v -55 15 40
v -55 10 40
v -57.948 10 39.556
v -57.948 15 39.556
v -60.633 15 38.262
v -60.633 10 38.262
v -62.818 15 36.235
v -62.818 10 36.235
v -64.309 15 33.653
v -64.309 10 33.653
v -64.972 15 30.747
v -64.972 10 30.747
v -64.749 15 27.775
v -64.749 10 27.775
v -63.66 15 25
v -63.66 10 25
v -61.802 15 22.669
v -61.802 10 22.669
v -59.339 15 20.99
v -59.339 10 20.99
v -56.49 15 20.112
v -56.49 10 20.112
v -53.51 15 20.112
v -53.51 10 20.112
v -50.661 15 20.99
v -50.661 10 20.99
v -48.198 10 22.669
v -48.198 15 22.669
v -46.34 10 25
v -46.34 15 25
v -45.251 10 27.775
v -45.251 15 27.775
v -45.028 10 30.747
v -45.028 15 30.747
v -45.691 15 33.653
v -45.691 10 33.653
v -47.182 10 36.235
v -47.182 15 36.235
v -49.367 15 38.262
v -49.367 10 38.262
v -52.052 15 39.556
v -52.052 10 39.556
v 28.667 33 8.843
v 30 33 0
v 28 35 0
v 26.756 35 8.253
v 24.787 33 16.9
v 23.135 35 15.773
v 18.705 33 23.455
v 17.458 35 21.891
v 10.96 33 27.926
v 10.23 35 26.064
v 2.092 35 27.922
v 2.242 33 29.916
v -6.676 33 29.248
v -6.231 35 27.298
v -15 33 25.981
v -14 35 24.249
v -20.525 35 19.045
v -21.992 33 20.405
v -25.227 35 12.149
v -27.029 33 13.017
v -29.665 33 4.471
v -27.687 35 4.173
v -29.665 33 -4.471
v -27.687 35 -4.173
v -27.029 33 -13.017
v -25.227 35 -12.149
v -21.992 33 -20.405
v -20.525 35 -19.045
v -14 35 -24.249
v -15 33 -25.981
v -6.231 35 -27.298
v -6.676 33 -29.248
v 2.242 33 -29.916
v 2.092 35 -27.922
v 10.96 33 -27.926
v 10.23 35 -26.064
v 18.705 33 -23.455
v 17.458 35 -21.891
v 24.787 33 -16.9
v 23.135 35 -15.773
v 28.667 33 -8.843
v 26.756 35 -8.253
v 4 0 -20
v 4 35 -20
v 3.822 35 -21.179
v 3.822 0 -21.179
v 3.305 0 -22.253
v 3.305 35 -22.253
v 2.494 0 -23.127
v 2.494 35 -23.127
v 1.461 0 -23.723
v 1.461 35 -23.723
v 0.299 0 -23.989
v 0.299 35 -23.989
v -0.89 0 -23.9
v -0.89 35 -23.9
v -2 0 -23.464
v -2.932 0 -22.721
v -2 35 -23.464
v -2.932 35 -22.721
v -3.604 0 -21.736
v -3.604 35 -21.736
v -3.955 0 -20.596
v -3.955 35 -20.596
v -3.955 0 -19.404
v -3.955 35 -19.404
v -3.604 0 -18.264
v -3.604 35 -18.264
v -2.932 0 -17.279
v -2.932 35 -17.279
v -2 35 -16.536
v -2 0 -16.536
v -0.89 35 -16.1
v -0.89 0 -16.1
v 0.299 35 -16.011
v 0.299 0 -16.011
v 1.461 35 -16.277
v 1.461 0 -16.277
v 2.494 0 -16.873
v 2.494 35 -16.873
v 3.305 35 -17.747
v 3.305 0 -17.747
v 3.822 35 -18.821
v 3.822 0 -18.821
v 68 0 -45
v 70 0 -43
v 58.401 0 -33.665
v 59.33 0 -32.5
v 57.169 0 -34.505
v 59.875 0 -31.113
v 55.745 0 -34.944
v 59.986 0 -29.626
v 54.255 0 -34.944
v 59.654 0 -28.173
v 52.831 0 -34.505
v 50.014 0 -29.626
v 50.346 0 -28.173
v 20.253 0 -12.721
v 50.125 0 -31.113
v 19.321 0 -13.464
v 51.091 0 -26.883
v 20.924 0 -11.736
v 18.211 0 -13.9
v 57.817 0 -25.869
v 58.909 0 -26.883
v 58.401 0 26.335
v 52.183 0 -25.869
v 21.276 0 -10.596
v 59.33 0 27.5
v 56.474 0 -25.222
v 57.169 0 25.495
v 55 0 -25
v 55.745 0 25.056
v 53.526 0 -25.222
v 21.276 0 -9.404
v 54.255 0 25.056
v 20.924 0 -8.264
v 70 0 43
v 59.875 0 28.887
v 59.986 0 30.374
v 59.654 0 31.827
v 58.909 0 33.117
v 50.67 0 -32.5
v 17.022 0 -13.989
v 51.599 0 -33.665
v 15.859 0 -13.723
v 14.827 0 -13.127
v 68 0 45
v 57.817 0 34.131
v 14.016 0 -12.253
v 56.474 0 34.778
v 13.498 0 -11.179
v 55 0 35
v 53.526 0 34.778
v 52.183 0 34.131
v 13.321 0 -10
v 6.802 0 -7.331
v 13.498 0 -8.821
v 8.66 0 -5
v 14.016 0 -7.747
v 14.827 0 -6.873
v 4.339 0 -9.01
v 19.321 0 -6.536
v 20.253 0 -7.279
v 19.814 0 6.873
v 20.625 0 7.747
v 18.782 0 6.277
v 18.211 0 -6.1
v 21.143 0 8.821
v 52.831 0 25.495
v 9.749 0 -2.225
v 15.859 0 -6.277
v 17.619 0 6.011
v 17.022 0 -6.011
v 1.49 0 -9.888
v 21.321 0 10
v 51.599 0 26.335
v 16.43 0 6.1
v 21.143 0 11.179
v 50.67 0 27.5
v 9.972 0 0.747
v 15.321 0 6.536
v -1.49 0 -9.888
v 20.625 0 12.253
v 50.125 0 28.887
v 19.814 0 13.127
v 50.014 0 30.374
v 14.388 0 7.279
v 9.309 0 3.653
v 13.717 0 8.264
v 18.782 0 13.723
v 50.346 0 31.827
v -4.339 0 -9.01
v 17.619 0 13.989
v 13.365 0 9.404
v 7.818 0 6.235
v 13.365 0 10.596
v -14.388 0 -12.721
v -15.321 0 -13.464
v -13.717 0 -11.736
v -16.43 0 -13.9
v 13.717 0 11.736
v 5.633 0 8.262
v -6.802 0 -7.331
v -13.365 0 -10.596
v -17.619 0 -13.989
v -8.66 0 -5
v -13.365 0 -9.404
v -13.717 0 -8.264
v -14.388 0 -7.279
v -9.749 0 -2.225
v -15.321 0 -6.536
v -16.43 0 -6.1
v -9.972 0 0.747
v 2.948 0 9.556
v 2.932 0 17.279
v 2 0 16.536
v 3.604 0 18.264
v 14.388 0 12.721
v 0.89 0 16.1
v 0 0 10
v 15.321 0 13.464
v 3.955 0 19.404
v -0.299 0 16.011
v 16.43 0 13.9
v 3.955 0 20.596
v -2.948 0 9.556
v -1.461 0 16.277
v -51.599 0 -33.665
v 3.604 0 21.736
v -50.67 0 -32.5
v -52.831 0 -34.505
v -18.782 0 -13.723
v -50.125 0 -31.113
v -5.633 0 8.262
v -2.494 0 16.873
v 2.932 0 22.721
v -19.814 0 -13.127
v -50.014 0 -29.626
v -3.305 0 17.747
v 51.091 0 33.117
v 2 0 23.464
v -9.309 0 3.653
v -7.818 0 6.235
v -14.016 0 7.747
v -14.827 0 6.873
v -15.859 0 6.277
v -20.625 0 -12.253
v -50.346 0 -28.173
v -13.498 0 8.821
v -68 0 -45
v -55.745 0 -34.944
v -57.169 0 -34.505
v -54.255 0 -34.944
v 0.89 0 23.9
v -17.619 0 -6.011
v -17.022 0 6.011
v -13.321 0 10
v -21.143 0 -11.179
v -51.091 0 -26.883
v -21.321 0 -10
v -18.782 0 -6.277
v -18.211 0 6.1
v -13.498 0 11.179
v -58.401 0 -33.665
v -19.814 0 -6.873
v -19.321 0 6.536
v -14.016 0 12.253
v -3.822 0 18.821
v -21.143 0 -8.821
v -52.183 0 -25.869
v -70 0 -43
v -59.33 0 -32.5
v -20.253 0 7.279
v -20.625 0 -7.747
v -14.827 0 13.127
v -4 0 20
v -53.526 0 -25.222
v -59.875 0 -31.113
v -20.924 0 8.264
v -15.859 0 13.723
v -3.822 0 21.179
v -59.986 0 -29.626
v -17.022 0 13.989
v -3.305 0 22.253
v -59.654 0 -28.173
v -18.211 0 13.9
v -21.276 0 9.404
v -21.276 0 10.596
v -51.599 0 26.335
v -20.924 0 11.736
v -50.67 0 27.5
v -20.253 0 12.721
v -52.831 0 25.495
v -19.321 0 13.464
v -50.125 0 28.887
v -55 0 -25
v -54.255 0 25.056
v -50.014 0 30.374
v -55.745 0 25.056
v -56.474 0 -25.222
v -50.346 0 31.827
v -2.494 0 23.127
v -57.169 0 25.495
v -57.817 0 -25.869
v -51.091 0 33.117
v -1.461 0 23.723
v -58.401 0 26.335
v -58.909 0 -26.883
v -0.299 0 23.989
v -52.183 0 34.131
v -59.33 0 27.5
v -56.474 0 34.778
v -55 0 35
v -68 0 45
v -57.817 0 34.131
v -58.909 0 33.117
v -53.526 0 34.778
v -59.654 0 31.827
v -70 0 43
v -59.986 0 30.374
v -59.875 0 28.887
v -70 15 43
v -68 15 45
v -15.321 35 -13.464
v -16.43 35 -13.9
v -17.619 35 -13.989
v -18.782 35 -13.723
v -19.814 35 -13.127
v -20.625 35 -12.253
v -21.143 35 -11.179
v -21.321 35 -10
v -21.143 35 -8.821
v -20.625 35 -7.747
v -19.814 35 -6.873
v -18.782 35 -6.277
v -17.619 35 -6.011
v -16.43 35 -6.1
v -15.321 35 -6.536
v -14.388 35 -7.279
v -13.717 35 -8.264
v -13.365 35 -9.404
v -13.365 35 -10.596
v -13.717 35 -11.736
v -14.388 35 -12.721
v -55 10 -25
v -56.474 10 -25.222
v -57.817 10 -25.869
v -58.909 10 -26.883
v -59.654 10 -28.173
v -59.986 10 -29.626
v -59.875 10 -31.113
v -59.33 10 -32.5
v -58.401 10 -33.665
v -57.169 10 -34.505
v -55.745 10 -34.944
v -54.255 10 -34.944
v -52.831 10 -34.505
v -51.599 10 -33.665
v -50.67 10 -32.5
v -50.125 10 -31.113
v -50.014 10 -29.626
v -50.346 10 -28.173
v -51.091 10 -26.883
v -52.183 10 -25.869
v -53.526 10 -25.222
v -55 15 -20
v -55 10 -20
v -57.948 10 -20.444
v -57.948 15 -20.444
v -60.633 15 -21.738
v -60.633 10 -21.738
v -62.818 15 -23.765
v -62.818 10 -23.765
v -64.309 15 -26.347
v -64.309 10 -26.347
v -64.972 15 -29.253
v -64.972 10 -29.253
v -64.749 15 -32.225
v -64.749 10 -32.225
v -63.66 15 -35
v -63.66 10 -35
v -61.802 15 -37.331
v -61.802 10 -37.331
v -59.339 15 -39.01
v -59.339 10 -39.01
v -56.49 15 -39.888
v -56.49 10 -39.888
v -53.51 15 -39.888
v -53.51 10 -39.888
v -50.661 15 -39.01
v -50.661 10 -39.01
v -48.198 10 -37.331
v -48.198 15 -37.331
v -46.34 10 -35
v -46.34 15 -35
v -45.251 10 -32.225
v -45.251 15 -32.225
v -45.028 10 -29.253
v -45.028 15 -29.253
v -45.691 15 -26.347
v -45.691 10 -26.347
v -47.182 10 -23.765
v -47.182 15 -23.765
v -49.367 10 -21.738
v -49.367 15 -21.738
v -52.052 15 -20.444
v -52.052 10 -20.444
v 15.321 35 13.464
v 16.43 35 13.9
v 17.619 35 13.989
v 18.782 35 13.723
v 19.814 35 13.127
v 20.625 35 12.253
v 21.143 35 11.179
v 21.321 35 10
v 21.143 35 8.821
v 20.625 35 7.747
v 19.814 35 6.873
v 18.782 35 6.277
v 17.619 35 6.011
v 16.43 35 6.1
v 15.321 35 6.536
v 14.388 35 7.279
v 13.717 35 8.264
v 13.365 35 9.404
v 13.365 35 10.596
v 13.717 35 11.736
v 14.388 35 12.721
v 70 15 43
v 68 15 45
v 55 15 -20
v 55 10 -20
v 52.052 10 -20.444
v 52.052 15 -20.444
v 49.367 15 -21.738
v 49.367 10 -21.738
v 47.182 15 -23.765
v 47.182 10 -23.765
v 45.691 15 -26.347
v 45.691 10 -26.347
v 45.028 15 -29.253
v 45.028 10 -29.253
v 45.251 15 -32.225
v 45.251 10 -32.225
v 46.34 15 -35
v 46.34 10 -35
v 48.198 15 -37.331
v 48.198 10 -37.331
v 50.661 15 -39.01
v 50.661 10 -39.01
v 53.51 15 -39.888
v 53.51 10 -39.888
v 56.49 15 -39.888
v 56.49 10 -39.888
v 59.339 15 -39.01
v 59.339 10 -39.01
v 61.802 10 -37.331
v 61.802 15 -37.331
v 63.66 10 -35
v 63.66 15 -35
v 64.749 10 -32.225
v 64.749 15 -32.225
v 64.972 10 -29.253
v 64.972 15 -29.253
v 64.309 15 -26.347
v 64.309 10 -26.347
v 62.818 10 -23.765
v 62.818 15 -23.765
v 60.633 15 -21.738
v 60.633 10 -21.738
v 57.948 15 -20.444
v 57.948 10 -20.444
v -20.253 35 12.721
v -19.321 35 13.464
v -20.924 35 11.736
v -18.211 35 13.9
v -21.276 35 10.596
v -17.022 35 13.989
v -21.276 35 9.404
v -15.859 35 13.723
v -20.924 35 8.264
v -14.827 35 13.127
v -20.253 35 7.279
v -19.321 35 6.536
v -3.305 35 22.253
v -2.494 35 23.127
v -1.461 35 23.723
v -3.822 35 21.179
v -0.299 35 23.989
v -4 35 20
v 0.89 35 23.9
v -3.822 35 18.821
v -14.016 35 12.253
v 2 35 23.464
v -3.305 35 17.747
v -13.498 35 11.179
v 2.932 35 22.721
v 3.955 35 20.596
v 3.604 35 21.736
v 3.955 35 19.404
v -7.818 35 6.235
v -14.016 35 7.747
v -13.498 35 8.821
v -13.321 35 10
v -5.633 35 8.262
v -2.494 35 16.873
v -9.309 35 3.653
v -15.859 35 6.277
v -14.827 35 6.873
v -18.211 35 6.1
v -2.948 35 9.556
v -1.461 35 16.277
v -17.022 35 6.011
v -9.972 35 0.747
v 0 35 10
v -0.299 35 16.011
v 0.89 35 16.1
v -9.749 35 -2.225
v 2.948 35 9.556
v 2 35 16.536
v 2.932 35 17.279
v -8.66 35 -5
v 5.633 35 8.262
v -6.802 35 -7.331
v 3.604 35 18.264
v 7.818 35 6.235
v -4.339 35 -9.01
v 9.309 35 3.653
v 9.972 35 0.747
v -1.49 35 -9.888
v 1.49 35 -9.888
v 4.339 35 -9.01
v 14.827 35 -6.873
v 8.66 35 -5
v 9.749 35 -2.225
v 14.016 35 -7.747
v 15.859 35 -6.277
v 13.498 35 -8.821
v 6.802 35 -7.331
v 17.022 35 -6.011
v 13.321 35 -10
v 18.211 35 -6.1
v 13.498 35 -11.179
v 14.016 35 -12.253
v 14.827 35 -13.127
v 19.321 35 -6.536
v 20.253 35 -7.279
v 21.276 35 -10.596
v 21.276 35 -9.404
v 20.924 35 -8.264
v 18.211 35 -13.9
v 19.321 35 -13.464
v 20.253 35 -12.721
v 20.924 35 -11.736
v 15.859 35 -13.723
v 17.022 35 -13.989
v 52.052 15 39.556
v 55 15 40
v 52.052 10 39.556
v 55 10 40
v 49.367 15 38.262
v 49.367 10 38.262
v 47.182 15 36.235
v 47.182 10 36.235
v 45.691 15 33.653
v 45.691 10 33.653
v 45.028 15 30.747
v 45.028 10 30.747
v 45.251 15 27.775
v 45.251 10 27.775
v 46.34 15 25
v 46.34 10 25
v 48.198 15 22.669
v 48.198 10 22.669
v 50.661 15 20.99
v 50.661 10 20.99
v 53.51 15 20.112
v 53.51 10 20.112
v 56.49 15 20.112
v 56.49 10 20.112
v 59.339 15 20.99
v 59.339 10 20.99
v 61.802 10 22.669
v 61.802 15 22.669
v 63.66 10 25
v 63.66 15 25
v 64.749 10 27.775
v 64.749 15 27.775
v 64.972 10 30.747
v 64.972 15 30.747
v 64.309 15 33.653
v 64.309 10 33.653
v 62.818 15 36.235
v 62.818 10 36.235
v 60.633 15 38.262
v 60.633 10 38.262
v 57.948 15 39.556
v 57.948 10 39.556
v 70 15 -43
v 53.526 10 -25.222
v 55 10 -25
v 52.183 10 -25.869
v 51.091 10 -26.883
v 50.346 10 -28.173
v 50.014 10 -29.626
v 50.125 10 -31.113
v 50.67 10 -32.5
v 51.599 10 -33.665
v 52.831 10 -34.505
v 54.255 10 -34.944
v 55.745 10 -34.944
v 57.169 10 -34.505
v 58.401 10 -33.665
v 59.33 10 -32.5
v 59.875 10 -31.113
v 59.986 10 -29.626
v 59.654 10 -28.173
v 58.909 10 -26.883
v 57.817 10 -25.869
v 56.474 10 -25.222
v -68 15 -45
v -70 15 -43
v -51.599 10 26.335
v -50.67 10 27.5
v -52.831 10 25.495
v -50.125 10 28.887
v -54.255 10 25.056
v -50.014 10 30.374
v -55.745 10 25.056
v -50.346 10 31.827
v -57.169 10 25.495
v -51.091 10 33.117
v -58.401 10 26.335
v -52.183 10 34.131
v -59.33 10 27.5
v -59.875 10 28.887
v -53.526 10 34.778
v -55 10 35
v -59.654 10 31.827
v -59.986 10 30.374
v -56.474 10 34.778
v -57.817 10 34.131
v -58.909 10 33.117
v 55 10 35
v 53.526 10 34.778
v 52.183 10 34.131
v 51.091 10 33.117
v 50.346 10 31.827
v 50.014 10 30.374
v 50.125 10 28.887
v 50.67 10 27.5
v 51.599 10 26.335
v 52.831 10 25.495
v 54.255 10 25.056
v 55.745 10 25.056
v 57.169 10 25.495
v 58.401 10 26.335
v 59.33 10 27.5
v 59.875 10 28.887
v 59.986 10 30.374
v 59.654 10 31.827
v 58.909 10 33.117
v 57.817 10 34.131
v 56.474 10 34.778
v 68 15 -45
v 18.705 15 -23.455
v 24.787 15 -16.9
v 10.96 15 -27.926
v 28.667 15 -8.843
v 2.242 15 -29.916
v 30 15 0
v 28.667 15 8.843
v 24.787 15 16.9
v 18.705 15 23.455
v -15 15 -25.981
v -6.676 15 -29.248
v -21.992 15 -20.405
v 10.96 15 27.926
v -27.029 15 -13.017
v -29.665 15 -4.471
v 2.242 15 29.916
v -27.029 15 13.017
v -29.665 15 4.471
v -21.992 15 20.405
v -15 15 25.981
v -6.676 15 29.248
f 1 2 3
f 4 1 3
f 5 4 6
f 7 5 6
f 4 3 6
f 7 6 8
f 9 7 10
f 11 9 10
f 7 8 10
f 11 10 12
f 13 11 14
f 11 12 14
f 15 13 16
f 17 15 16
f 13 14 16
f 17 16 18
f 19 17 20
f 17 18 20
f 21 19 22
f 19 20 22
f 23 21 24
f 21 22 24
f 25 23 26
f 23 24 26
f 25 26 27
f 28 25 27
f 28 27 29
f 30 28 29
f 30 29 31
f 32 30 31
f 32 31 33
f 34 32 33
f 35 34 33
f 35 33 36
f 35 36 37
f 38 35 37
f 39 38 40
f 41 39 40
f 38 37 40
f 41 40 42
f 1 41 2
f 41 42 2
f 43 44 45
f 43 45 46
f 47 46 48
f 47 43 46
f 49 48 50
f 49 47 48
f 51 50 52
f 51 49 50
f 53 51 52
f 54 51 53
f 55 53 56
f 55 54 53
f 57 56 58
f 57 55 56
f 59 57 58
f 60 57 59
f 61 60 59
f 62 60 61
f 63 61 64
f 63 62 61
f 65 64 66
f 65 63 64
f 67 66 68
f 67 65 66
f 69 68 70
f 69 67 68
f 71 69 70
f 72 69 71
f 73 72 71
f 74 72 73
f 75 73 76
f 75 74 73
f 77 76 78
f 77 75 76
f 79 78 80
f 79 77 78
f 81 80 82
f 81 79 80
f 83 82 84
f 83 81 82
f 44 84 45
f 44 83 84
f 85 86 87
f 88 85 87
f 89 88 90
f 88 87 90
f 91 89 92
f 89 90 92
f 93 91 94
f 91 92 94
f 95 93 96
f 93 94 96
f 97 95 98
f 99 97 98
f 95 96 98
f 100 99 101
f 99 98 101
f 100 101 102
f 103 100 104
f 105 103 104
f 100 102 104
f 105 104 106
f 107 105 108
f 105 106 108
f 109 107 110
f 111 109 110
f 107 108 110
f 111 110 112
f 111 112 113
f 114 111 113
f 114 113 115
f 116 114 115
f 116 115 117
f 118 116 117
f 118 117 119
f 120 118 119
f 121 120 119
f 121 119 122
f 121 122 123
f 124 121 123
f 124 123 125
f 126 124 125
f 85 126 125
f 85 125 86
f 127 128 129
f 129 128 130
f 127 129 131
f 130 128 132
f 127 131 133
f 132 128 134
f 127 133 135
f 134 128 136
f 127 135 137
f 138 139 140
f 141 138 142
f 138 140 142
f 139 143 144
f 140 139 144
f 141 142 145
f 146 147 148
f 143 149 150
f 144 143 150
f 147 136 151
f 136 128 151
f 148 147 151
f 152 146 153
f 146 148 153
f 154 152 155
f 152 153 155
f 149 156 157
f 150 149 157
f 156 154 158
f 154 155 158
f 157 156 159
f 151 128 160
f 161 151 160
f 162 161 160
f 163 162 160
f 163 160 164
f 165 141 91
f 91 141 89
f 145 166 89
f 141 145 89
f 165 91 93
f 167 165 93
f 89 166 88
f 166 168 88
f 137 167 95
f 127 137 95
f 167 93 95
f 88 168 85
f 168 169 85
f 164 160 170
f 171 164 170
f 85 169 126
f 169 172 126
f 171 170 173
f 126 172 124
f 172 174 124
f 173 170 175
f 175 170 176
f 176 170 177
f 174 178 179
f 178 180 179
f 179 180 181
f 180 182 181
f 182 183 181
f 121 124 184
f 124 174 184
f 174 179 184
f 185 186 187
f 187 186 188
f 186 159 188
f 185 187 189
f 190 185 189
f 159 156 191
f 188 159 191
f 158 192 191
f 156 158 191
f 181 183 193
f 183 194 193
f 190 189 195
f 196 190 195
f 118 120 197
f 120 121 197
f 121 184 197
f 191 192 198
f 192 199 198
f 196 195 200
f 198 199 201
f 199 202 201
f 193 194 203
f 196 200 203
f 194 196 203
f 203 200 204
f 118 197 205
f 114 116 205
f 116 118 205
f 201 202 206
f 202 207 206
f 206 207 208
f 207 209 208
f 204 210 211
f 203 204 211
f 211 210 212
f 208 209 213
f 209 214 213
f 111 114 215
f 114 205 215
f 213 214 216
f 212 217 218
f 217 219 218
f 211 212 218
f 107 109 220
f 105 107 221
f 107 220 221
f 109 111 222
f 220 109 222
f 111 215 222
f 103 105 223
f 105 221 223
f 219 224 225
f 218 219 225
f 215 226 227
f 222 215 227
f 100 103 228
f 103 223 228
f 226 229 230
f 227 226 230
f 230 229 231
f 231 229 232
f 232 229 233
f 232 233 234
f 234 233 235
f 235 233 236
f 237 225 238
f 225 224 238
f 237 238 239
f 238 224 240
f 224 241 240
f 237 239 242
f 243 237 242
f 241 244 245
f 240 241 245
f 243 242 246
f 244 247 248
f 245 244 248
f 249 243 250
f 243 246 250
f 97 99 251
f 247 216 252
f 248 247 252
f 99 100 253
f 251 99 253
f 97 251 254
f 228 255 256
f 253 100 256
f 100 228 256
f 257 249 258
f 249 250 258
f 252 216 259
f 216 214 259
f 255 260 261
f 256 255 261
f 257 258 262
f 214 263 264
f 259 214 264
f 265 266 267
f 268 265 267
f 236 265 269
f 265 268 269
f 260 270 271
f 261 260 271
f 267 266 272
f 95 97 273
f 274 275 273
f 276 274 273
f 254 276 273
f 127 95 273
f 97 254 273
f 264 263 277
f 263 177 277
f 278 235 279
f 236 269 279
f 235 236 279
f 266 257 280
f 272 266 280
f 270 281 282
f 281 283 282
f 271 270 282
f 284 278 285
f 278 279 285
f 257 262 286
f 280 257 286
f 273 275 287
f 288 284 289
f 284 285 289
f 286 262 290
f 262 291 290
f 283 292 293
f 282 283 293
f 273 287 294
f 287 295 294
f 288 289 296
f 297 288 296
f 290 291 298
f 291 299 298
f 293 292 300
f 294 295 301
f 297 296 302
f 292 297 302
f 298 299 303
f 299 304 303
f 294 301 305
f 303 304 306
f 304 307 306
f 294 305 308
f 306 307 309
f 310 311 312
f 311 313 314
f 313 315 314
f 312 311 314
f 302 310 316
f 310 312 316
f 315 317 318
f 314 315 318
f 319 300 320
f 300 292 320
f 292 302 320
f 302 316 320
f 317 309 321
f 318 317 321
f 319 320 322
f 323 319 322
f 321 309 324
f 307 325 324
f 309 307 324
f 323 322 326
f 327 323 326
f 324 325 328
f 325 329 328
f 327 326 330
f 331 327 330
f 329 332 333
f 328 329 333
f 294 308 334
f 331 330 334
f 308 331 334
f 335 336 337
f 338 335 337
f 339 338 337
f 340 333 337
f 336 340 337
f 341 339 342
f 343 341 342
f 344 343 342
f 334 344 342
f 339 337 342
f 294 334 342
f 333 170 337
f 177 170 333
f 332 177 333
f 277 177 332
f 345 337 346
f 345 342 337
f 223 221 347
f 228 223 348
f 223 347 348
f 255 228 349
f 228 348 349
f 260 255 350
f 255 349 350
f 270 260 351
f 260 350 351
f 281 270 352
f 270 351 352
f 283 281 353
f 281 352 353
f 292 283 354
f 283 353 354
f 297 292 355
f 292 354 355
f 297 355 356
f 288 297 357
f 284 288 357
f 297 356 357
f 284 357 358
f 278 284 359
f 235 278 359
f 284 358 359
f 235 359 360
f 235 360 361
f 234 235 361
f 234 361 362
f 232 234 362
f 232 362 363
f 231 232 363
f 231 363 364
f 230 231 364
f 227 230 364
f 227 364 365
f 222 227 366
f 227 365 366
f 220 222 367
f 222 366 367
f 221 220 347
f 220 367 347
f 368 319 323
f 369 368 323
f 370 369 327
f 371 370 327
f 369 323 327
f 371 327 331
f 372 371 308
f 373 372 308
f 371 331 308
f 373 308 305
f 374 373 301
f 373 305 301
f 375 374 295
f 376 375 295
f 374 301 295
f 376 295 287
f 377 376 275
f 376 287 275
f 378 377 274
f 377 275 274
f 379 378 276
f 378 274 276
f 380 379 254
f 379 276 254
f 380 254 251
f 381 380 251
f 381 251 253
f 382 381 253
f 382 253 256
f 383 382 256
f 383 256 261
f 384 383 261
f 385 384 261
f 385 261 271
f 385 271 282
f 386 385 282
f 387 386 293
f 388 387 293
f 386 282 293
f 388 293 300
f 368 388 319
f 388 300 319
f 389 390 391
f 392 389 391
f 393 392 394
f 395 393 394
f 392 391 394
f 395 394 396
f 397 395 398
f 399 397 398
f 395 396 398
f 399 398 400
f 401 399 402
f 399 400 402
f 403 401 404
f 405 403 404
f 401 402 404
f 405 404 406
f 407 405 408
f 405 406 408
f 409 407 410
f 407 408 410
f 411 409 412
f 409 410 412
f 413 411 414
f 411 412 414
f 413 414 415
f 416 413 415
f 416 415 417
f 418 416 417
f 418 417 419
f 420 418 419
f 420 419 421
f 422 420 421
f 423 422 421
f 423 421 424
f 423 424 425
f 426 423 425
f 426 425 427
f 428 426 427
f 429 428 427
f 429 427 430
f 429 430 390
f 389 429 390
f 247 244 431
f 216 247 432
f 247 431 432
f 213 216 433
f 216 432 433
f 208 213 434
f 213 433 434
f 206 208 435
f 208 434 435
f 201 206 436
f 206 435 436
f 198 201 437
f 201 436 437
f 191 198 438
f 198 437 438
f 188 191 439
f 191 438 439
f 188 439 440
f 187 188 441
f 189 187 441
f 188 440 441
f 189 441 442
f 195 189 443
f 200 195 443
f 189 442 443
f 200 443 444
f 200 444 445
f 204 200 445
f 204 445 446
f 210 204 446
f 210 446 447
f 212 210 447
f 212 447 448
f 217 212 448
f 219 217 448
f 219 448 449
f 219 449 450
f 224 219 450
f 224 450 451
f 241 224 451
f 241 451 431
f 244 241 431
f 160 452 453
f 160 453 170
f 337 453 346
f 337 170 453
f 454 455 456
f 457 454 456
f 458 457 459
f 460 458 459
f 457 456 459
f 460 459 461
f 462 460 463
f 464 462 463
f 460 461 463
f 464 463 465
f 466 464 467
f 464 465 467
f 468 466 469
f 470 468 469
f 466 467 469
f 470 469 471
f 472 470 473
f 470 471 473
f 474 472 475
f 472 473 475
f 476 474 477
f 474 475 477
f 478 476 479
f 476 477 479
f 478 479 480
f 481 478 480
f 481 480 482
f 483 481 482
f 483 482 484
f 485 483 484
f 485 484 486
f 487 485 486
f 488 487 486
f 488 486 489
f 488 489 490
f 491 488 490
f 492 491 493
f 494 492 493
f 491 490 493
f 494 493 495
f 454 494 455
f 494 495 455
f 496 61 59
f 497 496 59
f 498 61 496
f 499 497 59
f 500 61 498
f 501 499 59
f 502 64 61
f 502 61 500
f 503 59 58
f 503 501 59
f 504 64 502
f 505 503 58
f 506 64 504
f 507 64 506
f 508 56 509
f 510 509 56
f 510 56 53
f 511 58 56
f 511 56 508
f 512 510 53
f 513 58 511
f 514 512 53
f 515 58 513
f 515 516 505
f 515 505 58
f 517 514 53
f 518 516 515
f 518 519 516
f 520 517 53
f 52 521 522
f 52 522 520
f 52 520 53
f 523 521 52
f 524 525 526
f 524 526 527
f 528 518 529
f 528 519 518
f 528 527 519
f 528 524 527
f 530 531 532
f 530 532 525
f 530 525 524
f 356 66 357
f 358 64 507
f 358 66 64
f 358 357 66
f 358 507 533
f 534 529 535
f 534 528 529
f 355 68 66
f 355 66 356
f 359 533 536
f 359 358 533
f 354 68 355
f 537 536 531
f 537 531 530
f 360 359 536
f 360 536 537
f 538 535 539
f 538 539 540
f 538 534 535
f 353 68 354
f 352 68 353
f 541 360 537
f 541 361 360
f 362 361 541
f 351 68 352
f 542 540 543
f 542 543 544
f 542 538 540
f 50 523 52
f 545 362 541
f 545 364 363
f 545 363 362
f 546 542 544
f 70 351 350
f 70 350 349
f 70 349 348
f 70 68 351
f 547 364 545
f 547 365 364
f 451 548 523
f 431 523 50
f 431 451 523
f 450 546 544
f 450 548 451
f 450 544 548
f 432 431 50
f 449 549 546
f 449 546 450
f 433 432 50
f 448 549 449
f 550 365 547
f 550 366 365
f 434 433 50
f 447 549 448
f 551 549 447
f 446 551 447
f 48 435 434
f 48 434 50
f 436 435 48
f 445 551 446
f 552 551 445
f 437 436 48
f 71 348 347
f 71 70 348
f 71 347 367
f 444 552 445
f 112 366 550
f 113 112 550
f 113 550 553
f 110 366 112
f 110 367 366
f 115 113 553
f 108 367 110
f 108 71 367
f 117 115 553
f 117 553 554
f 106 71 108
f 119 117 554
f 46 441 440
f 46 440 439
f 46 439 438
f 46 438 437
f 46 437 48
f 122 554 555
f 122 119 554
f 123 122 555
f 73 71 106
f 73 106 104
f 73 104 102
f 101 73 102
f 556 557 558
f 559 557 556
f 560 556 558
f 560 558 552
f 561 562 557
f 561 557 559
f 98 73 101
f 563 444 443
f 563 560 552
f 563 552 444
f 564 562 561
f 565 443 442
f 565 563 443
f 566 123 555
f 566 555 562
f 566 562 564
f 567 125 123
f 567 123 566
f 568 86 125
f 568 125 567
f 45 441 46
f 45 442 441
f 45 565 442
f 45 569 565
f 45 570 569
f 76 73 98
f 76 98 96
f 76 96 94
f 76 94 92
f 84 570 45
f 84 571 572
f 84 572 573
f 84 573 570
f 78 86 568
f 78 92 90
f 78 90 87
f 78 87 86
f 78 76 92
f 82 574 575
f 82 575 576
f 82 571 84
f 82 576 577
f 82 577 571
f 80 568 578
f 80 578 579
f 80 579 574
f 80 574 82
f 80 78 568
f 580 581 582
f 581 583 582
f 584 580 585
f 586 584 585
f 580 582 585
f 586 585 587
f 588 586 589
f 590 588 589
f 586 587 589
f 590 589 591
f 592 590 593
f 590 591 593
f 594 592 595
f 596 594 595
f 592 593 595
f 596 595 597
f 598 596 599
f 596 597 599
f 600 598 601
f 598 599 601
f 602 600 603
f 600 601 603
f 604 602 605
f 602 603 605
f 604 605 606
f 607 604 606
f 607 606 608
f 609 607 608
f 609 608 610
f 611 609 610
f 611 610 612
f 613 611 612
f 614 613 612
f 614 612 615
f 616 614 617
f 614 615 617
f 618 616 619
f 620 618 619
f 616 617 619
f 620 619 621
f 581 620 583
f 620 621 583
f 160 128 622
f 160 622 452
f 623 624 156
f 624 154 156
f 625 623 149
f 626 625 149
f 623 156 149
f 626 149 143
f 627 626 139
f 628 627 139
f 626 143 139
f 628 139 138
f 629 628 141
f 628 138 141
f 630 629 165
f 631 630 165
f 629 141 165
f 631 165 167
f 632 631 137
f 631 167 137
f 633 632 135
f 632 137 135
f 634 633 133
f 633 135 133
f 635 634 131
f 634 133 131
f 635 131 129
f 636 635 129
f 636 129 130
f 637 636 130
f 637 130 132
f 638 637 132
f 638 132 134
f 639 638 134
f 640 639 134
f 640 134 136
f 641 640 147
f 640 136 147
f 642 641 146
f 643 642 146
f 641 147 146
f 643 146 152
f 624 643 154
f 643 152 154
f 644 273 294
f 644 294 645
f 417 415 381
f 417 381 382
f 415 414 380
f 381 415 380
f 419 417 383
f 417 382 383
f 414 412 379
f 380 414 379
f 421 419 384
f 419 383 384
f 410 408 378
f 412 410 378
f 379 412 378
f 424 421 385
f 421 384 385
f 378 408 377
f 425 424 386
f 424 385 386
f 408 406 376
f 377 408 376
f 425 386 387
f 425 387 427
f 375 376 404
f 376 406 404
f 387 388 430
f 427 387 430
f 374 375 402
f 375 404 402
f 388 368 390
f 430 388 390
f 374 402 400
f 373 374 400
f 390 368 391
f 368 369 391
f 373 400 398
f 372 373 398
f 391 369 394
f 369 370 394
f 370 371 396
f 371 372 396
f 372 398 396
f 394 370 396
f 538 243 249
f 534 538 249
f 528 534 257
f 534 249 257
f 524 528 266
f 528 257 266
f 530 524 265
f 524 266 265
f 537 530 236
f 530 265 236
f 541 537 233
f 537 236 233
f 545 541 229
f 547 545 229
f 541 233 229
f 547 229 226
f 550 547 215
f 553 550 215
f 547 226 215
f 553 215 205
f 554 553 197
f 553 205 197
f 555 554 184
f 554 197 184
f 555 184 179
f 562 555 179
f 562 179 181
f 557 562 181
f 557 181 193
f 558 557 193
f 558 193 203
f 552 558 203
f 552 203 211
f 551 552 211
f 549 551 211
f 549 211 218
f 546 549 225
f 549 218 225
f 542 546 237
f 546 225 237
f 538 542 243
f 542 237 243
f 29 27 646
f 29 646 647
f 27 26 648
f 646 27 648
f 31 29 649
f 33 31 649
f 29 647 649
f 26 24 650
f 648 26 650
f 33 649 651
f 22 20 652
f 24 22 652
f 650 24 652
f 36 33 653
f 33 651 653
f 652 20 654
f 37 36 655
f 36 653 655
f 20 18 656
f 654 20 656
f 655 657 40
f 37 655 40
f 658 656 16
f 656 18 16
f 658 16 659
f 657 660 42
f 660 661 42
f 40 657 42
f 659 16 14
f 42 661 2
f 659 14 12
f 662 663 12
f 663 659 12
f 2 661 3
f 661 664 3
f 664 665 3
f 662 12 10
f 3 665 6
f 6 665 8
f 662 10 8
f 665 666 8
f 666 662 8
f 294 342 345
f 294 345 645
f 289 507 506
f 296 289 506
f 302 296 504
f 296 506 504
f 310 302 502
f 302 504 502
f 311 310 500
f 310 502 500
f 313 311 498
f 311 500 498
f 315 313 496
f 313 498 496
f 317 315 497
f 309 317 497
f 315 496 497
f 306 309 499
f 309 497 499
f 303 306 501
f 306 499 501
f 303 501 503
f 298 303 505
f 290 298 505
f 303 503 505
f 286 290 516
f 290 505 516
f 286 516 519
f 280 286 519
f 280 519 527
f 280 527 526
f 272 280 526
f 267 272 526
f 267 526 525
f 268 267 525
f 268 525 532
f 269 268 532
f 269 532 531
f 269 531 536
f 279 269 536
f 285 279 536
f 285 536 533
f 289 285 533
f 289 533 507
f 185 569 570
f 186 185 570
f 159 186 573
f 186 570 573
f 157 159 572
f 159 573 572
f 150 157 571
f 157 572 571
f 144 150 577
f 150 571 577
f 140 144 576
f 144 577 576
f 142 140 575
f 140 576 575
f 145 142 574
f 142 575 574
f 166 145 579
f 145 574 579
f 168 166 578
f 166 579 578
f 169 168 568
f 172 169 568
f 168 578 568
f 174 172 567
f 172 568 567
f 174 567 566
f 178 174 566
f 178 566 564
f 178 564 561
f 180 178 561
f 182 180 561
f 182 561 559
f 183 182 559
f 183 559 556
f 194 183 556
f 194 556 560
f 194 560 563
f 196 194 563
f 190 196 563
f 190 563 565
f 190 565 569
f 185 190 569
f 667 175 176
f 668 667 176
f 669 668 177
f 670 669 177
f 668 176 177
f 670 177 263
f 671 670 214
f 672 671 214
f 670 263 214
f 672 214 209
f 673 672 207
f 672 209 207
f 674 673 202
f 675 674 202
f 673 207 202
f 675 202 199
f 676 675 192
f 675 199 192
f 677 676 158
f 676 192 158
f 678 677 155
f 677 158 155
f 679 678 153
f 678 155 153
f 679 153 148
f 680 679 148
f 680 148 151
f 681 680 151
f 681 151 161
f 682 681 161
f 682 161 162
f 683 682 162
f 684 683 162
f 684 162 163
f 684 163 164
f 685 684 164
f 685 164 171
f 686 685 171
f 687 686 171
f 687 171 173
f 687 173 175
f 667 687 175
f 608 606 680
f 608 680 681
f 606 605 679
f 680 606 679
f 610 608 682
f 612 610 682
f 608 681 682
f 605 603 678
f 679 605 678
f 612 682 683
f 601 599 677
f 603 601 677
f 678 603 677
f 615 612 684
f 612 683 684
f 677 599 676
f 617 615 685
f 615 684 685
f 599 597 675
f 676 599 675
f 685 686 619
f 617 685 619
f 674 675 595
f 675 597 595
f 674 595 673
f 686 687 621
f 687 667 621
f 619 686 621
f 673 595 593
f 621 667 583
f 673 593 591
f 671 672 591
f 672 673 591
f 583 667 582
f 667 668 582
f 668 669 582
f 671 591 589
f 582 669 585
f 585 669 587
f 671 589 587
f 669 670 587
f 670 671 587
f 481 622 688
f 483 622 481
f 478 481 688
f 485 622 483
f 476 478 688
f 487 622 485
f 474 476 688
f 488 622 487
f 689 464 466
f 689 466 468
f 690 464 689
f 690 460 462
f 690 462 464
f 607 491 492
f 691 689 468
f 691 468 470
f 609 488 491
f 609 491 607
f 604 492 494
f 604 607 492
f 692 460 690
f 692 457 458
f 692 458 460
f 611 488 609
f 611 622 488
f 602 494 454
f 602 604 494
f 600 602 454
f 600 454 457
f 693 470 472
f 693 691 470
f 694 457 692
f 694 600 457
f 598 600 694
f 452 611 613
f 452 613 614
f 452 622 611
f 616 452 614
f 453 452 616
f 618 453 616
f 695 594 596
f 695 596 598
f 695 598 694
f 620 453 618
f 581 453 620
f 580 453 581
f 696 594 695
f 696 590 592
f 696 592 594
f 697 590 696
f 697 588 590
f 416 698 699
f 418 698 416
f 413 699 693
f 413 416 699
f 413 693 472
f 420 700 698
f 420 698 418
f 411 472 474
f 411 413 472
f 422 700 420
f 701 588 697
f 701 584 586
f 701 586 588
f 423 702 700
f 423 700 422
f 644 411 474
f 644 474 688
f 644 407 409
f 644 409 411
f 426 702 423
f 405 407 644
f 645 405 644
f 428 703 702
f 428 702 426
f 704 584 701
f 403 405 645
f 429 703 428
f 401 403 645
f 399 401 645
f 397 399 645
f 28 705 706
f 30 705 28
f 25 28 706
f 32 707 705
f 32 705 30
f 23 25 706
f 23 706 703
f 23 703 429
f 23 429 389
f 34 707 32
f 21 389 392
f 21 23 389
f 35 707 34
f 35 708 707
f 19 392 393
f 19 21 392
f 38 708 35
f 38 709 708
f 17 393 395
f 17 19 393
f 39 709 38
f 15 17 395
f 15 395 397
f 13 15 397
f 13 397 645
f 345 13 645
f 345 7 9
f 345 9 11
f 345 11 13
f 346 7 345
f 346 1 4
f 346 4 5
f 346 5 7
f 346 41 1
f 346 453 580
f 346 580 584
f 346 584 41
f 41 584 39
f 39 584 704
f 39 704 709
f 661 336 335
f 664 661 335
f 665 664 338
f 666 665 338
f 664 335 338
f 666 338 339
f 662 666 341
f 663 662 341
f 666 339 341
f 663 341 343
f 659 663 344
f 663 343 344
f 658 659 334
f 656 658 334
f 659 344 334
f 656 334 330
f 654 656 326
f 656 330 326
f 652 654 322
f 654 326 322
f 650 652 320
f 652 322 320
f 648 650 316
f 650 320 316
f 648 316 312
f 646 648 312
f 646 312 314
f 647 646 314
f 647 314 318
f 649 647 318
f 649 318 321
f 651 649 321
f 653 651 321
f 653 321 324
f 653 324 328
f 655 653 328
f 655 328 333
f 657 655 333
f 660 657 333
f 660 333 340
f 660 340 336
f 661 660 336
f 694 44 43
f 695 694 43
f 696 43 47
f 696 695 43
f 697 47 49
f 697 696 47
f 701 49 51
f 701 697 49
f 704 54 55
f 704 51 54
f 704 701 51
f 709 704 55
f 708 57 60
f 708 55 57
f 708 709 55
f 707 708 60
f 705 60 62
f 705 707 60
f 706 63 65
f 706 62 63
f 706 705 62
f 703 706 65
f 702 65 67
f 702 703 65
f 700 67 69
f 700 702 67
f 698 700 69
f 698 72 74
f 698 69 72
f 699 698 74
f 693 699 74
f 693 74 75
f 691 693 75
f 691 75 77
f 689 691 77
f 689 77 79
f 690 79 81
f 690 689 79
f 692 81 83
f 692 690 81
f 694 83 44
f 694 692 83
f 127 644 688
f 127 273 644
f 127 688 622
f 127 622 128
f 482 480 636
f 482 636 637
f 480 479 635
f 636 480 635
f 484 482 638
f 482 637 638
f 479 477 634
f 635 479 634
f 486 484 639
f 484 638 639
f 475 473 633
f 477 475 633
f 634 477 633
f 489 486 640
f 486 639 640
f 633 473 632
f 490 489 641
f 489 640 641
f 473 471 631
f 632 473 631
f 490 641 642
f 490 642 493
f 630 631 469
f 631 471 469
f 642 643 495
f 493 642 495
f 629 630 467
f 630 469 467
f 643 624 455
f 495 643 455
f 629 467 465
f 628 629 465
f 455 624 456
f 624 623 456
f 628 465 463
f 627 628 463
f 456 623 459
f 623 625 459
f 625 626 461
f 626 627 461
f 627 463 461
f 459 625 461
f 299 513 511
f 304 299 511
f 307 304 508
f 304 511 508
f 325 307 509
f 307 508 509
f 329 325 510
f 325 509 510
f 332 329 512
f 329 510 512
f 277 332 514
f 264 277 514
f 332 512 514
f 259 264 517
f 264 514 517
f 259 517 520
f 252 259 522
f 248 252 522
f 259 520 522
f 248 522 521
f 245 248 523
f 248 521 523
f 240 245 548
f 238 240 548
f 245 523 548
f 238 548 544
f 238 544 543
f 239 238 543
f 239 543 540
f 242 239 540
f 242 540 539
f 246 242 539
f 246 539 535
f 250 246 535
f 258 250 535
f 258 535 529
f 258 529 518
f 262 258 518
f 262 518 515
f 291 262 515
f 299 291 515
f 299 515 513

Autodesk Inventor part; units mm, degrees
ref_plane "YZ Plane" through (0, 0, 0) normal (1, 0, 0) x (0, 1, 0)
ref_plane "XZ Plane" through (0, 0, 0) normal (0, 1, 0) x (-1, 0, 0)
ref_plane "XY Plane" through (0, 0, 0) normal (0, 0, 1) x (1, 0, 0)
sketch "Náčrt3" plane through (0, 0, 0) normal (0, 1, 0) x (-1, 0, 0)
  line L0 (-70, 45) -> (70, 45)
  line L1 (70, 45) -> (70, -45)
  line L2 (70, -45) -> (-70, -45)
  line L3 (-70, -45) -> (-70, 45)
  line L4 (-70, 45) -> (70, -45) construction
  line L5 (70, 45) -> (-70, -45) construction
  point P0 (0, 0)
  dimension "d31" = 140
  dimension "d32" = 90
extrude "Vysunutí" add sketch "Náčrt3" along normal blind 15
chamfer "Zkosení1" distance 2 angle 45 1 edges at (70, 7.5, 45)
chamfer "Zkosení2" distance 2 angle 45 1 edges at (70, 7.5, -45)
chamfer "Zkosení3" distance 2 angle 45 1 edges at (-70, 7.5, 45)
chamfer "Zkosení4" distance 2 angle 45 1 edges at (-70, 7.5, -45)
sketch "Náčrt4" plane through (0, 15, 0) normal (0, 1, 0) x (1, 0, 0)
  line L0 (68, 45) -> (-68, 45) projected
  line L1 (-70, 43) -> (-70, -43) projected
  point P0 (0, 0)
  point P1 (-55, 30)
  dimension "d47" = 15
  dimension "d48" = 15
hole "Díra" at (-55, 15, -30) direction (0, -1, 0) diameter 10 end through all counterbore diameter 20 counterbore depth 5
pattern_linear "Obdélníkové pole" count 2 spacing 110 along (1, 0, 0) count 2 spacing 60 along (0, 0, 1) of "Díra"
sketch "Náčrt5" plane through (0, 15, 0) normal (0, 1, 0) x (1, 0, 0)
  circle A0 centre (0, 0) radius 30
  dimension "d62" = 60
extrude "Vysunutí2" add sketch "Náčrt5" along normal blind 20
chamfer "Zkosení5" distance 2 angle 45 1 edges at (-30, 35, 0)
sketch "Náčrt6" plane through (0, 35, 0) normal (0, 1, 0) x (1, 0, 0)
  circle A0 centre (0, 0) radius 28 projected
hole "Díra3" at (0, 35, 0) direction (0, -1, 0) diameter 20 end through all
sketch "Náčrt12" plane through (0, 35, 0) normal (0, 1, 0) x (1, 0, 0)
  circle A0 centre (0, 0) radius 20
  circle A1 centre (0, 20) radius 4
  dimension "d114" = 40
  dimension "d115" = 8
extrude "Vysunutí3" cut sketch "Náčrt12" against normal through all contours A1 A0 | A0 A1 picked at (0, 18.6369) picked at (0.0994, 21.2999)
pattern_circular "Kruhové pole" count 6 over 360 about axis through (0, -135.0735, 0) along (0, 1, 0) of "Vysunutí3"
properties part number "desticka"
